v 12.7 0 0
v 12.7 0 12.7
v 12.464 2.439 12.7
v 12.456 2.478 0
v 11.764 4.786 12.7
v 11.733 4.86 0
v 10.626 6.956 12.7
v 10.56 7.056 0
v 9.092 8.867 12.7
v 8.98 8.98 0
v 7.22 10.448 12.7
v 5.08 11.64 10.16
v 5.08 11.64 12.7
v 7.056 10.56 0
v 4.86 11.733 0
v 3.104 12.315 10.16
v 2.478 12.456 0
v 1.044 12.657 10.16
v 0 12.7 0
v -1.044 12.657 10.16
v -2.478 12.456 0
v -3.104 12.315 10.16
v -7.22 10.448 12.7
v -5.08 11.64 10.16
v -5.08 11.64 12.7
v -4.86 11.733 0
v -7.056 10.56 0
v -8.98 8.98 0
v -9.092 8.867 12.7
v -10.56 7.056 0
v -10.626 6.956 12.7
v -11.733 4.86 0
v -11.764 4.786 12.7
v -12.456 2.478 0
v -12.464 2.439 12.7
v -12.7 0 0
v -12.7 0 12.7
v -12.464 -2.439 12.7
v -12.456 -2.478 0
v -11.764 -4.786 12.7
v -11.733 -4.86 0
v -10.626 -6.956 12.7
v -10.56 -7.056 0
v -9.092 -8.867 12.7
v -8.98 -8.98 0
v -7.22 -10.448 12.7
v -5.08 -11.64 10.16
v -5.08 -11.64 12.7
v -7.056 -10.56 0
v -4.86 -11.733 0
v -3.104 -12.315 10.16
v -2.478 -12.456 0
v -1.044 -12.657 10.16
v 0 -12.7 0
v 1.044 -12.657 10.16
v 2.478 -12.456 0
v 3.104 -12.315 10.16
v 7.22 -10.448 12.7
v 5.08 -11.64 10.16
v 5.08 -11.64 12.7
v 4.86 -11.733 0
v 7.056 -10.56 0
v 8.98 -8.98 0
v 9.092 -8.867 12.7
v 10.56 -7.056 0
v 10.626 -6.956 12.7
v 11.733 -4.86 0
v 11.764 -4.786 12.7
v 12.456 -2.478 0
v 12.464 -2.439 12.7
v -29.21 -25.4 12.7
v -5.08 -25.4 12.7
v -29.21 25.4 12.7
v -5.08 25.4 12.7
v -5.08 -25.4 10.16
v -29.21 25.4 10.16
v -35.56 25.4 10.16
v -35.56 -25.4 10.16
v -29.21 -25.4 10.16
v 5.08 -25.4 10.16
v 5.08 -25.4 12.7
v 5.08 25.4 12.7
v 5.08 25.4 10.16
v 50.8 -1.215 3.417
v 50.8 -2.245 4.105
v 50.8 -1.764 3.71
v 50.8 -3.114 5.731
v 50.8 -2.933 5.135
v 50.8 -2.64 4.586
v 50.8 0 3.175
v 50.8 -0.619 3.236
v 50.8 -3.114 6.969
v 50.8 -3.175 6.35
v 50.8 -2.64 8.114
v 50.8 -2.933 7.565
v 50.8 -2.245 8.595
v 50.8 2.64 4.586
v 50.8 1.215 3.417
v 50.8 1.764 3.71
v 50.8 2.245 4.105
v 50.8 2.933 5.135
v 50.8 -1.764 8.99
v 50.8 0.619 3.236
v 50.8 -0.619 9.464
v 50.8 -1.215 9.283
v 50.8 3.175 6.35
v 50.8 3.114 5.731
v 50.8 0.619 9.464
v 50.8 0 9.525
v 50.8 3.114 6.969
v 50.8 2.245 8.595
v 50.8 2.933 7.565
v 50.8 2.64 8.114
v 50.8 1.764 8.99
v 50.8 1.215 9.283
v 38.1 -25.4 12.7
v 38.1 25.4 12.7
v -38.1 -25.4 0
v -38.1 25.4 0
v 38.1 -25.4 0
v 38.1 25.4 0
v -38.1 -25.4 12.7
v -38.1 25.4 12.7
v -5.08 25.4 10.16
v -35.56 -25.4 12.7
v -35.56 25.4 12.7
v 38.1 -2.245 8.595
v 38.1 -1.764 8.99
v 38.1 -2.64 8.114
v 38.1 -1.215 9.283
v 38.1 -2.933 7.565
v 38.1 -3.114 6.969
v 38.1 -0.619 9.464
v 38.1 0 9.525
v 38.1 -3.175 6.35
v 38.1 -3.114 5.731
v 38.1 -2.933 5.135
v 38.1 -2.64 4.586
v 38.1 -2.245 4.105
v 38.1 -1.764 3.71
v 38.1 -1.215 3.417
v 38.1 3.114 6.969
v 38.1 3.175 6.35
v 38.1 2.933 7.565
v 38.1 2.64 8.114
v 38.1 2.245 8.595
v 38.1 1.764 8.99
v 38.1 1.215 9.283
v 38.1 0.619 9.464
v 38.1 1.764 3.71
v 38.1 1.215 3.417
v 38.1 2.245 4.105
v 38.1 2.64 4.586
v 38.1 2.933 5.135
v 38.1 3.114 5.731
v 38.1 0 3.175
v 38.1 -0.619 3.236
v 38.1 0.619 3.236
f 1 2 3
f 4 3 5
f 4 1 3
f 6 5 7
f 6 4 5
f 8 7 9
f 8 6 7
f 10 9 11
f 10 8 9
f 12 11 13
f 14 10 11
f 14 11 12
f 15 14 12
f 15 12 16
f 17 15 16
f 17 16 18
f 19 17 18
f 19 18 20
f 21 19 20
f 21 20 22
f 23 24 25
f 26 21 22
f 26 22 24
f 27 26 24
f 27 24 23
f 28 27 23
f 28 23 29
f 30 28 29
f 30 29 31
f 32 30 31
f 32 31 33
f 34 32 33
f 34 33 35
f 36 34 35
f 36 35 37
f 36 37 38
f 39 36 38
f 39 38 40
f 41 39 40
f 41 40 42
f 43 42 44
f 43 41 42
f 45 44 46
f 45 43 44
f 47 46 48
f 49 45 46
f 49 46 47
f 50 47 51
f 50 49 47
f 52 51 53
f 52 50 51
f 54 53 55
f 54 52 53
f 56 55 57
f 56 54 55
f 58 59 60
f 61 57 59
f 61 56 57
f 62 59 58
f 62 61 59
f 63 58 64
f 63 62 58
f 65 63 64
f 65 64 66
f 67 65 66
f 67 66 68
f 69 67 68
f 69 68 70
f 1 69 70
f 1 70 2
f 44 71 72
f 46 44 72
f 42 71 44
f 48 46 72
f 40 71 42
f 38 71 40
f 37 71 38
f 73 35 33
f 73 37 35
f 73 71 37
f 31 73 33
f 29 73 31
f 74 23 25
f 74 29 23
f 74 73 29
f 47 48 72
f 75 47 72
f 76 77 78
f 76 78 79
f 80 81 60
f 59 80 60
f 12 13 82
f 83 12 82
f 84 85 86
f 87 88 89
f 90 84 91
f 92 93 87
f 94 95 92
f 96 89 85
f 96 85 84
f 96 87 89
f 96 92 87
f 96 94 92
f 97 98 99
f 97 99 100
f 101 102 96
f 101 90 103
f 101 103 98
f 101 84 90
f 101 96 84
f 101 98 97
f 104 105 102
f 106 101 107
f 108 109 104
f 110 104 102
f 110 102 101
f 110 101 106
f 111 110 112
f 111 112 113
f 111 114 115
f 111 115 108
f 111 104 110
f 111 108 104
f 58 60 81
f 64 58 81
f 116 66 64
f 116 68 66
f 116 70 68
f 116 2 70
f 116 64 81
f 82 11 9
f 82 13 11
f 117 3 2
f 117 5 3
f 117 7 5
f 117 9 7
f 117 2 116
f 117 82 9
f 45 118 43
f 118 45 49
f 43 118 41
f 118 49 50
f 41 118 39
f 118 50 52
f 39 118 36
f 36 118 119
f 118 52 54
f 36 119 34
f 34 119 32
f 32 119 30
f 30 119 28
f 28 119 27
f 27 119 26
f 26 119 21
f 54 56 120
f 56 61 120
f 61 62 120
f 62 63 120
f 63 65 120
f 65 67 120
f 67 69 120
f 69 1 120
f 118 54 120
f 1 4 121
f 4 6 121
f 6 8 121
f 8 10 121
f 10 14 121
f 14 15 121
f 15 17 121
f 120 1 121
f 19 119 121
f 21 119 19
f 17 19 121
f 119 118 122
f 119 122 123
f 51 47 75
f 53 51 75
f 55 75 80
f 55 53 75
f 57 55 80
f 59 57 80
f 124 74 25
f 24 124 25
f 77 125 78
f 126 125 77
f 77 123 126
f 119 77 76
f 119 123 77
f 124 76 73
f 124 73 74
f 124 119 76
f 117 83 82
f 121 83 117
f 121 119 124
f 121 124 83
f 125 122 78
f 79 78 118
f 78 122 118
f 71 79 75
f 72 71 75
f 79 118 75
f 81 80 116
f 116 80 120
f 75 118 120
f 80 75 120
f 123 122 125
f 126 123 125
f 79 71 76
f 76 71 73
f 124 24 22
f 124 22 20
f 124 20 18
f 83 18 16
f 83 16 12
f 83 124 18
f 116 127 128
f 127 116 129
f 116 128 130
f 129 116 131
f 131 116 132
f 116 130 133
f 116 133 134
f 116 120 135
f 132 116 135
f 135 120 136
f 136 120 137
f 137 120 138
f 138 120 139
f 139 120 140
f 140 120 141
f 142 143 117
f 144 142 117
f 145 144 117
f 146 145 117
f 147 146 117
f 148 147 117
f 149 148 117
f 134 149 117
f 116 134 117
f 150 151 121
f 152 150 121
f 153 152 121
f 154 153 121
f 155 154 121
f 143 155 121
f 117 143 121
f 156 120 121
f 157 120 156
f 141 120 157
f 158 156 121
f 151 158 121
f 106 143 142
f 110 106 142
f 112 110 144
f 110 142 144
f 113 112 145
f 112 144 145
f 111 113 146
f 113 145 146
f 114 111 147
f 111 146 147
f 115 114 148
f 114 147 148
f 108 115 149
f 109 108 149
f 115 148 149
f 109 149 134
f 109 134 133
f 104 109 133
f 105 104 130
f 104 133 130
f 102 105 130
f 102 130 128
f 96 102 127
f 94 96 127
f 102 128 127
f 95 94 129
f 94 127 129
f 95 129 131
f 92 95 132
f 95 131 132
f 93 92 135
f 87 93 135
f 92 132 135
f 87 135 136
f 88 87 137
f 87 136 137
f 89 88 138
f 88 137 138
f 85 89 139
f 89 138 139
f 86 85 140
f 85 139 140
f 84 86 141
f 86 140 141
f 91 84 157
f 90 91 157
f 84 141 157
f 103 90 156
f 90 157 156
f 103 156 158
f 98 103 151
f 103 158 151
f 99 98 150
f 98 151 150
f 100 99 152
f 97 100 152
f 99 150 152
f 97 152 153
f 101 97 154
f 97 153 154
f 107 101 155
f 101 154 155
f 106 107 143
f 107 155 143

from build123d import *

# Parameters (mm, degrees)
F0_W     = 76.2
F0_H     = 50.8
F0_R     = 12.7
F1_DEPTH = 12.7
F2_W     = 6.35
F2_H     = 50.8
F3_DEPTH = 2.54
F4_R     = 3.175
F5_DEPTH = 12.7


with BuildPart() as f1:
    # F0 (on Top) → F1 (new body)
    with BuildSketch(Plane.XY):
        Rectangle(F0_W, F0_H)
        Circle(F0_R, mode=Mode.SUBTRACT)
    extrude(amount=F1_DEPTH)

    # F2 (on face) → F3 (cut)
    with BuildSketch(Plane.XY.offset(12.7)):
        with Locations((-32.385, 0)):
            Rectangle(F2_W, F2_H)
        with BuildLine():
            Line((5.08, 25.4), (-5.08, 25.4))
            Line((-5.08, 25.4), (-5.08, 11.639742))
            ThreePointArc((-5.08, 11.639742), (0, 12.7), (5.08, 11.639742))
            Line((5.08, 11.639742), (5.08, 25.4))
        make_face()
        with BuildLine():
            Line((-5.08, -11.639742), (-5.08, -25.4))
            Line((-5.08, -25.4), (5.08, -25.4))
            Line((5.08, -25.4), (5.08, -11.639742))
            ThreePointArc((5.08, -11.639742), (0, -12.7), (-5.08, -11.639742))
        make_face()
    extrude(amount=-F3_DEPTH, mode=Mode.SUBTRACT)

    # F4 (on face) → F5 (join)
    with BuildSketch(Plane.YZ.offset(38.1)):
        with Locations((0, 6.35)):
            Circle(F4_R)
    extrude(amount=F5_DEPTH)


solid = f1.part
